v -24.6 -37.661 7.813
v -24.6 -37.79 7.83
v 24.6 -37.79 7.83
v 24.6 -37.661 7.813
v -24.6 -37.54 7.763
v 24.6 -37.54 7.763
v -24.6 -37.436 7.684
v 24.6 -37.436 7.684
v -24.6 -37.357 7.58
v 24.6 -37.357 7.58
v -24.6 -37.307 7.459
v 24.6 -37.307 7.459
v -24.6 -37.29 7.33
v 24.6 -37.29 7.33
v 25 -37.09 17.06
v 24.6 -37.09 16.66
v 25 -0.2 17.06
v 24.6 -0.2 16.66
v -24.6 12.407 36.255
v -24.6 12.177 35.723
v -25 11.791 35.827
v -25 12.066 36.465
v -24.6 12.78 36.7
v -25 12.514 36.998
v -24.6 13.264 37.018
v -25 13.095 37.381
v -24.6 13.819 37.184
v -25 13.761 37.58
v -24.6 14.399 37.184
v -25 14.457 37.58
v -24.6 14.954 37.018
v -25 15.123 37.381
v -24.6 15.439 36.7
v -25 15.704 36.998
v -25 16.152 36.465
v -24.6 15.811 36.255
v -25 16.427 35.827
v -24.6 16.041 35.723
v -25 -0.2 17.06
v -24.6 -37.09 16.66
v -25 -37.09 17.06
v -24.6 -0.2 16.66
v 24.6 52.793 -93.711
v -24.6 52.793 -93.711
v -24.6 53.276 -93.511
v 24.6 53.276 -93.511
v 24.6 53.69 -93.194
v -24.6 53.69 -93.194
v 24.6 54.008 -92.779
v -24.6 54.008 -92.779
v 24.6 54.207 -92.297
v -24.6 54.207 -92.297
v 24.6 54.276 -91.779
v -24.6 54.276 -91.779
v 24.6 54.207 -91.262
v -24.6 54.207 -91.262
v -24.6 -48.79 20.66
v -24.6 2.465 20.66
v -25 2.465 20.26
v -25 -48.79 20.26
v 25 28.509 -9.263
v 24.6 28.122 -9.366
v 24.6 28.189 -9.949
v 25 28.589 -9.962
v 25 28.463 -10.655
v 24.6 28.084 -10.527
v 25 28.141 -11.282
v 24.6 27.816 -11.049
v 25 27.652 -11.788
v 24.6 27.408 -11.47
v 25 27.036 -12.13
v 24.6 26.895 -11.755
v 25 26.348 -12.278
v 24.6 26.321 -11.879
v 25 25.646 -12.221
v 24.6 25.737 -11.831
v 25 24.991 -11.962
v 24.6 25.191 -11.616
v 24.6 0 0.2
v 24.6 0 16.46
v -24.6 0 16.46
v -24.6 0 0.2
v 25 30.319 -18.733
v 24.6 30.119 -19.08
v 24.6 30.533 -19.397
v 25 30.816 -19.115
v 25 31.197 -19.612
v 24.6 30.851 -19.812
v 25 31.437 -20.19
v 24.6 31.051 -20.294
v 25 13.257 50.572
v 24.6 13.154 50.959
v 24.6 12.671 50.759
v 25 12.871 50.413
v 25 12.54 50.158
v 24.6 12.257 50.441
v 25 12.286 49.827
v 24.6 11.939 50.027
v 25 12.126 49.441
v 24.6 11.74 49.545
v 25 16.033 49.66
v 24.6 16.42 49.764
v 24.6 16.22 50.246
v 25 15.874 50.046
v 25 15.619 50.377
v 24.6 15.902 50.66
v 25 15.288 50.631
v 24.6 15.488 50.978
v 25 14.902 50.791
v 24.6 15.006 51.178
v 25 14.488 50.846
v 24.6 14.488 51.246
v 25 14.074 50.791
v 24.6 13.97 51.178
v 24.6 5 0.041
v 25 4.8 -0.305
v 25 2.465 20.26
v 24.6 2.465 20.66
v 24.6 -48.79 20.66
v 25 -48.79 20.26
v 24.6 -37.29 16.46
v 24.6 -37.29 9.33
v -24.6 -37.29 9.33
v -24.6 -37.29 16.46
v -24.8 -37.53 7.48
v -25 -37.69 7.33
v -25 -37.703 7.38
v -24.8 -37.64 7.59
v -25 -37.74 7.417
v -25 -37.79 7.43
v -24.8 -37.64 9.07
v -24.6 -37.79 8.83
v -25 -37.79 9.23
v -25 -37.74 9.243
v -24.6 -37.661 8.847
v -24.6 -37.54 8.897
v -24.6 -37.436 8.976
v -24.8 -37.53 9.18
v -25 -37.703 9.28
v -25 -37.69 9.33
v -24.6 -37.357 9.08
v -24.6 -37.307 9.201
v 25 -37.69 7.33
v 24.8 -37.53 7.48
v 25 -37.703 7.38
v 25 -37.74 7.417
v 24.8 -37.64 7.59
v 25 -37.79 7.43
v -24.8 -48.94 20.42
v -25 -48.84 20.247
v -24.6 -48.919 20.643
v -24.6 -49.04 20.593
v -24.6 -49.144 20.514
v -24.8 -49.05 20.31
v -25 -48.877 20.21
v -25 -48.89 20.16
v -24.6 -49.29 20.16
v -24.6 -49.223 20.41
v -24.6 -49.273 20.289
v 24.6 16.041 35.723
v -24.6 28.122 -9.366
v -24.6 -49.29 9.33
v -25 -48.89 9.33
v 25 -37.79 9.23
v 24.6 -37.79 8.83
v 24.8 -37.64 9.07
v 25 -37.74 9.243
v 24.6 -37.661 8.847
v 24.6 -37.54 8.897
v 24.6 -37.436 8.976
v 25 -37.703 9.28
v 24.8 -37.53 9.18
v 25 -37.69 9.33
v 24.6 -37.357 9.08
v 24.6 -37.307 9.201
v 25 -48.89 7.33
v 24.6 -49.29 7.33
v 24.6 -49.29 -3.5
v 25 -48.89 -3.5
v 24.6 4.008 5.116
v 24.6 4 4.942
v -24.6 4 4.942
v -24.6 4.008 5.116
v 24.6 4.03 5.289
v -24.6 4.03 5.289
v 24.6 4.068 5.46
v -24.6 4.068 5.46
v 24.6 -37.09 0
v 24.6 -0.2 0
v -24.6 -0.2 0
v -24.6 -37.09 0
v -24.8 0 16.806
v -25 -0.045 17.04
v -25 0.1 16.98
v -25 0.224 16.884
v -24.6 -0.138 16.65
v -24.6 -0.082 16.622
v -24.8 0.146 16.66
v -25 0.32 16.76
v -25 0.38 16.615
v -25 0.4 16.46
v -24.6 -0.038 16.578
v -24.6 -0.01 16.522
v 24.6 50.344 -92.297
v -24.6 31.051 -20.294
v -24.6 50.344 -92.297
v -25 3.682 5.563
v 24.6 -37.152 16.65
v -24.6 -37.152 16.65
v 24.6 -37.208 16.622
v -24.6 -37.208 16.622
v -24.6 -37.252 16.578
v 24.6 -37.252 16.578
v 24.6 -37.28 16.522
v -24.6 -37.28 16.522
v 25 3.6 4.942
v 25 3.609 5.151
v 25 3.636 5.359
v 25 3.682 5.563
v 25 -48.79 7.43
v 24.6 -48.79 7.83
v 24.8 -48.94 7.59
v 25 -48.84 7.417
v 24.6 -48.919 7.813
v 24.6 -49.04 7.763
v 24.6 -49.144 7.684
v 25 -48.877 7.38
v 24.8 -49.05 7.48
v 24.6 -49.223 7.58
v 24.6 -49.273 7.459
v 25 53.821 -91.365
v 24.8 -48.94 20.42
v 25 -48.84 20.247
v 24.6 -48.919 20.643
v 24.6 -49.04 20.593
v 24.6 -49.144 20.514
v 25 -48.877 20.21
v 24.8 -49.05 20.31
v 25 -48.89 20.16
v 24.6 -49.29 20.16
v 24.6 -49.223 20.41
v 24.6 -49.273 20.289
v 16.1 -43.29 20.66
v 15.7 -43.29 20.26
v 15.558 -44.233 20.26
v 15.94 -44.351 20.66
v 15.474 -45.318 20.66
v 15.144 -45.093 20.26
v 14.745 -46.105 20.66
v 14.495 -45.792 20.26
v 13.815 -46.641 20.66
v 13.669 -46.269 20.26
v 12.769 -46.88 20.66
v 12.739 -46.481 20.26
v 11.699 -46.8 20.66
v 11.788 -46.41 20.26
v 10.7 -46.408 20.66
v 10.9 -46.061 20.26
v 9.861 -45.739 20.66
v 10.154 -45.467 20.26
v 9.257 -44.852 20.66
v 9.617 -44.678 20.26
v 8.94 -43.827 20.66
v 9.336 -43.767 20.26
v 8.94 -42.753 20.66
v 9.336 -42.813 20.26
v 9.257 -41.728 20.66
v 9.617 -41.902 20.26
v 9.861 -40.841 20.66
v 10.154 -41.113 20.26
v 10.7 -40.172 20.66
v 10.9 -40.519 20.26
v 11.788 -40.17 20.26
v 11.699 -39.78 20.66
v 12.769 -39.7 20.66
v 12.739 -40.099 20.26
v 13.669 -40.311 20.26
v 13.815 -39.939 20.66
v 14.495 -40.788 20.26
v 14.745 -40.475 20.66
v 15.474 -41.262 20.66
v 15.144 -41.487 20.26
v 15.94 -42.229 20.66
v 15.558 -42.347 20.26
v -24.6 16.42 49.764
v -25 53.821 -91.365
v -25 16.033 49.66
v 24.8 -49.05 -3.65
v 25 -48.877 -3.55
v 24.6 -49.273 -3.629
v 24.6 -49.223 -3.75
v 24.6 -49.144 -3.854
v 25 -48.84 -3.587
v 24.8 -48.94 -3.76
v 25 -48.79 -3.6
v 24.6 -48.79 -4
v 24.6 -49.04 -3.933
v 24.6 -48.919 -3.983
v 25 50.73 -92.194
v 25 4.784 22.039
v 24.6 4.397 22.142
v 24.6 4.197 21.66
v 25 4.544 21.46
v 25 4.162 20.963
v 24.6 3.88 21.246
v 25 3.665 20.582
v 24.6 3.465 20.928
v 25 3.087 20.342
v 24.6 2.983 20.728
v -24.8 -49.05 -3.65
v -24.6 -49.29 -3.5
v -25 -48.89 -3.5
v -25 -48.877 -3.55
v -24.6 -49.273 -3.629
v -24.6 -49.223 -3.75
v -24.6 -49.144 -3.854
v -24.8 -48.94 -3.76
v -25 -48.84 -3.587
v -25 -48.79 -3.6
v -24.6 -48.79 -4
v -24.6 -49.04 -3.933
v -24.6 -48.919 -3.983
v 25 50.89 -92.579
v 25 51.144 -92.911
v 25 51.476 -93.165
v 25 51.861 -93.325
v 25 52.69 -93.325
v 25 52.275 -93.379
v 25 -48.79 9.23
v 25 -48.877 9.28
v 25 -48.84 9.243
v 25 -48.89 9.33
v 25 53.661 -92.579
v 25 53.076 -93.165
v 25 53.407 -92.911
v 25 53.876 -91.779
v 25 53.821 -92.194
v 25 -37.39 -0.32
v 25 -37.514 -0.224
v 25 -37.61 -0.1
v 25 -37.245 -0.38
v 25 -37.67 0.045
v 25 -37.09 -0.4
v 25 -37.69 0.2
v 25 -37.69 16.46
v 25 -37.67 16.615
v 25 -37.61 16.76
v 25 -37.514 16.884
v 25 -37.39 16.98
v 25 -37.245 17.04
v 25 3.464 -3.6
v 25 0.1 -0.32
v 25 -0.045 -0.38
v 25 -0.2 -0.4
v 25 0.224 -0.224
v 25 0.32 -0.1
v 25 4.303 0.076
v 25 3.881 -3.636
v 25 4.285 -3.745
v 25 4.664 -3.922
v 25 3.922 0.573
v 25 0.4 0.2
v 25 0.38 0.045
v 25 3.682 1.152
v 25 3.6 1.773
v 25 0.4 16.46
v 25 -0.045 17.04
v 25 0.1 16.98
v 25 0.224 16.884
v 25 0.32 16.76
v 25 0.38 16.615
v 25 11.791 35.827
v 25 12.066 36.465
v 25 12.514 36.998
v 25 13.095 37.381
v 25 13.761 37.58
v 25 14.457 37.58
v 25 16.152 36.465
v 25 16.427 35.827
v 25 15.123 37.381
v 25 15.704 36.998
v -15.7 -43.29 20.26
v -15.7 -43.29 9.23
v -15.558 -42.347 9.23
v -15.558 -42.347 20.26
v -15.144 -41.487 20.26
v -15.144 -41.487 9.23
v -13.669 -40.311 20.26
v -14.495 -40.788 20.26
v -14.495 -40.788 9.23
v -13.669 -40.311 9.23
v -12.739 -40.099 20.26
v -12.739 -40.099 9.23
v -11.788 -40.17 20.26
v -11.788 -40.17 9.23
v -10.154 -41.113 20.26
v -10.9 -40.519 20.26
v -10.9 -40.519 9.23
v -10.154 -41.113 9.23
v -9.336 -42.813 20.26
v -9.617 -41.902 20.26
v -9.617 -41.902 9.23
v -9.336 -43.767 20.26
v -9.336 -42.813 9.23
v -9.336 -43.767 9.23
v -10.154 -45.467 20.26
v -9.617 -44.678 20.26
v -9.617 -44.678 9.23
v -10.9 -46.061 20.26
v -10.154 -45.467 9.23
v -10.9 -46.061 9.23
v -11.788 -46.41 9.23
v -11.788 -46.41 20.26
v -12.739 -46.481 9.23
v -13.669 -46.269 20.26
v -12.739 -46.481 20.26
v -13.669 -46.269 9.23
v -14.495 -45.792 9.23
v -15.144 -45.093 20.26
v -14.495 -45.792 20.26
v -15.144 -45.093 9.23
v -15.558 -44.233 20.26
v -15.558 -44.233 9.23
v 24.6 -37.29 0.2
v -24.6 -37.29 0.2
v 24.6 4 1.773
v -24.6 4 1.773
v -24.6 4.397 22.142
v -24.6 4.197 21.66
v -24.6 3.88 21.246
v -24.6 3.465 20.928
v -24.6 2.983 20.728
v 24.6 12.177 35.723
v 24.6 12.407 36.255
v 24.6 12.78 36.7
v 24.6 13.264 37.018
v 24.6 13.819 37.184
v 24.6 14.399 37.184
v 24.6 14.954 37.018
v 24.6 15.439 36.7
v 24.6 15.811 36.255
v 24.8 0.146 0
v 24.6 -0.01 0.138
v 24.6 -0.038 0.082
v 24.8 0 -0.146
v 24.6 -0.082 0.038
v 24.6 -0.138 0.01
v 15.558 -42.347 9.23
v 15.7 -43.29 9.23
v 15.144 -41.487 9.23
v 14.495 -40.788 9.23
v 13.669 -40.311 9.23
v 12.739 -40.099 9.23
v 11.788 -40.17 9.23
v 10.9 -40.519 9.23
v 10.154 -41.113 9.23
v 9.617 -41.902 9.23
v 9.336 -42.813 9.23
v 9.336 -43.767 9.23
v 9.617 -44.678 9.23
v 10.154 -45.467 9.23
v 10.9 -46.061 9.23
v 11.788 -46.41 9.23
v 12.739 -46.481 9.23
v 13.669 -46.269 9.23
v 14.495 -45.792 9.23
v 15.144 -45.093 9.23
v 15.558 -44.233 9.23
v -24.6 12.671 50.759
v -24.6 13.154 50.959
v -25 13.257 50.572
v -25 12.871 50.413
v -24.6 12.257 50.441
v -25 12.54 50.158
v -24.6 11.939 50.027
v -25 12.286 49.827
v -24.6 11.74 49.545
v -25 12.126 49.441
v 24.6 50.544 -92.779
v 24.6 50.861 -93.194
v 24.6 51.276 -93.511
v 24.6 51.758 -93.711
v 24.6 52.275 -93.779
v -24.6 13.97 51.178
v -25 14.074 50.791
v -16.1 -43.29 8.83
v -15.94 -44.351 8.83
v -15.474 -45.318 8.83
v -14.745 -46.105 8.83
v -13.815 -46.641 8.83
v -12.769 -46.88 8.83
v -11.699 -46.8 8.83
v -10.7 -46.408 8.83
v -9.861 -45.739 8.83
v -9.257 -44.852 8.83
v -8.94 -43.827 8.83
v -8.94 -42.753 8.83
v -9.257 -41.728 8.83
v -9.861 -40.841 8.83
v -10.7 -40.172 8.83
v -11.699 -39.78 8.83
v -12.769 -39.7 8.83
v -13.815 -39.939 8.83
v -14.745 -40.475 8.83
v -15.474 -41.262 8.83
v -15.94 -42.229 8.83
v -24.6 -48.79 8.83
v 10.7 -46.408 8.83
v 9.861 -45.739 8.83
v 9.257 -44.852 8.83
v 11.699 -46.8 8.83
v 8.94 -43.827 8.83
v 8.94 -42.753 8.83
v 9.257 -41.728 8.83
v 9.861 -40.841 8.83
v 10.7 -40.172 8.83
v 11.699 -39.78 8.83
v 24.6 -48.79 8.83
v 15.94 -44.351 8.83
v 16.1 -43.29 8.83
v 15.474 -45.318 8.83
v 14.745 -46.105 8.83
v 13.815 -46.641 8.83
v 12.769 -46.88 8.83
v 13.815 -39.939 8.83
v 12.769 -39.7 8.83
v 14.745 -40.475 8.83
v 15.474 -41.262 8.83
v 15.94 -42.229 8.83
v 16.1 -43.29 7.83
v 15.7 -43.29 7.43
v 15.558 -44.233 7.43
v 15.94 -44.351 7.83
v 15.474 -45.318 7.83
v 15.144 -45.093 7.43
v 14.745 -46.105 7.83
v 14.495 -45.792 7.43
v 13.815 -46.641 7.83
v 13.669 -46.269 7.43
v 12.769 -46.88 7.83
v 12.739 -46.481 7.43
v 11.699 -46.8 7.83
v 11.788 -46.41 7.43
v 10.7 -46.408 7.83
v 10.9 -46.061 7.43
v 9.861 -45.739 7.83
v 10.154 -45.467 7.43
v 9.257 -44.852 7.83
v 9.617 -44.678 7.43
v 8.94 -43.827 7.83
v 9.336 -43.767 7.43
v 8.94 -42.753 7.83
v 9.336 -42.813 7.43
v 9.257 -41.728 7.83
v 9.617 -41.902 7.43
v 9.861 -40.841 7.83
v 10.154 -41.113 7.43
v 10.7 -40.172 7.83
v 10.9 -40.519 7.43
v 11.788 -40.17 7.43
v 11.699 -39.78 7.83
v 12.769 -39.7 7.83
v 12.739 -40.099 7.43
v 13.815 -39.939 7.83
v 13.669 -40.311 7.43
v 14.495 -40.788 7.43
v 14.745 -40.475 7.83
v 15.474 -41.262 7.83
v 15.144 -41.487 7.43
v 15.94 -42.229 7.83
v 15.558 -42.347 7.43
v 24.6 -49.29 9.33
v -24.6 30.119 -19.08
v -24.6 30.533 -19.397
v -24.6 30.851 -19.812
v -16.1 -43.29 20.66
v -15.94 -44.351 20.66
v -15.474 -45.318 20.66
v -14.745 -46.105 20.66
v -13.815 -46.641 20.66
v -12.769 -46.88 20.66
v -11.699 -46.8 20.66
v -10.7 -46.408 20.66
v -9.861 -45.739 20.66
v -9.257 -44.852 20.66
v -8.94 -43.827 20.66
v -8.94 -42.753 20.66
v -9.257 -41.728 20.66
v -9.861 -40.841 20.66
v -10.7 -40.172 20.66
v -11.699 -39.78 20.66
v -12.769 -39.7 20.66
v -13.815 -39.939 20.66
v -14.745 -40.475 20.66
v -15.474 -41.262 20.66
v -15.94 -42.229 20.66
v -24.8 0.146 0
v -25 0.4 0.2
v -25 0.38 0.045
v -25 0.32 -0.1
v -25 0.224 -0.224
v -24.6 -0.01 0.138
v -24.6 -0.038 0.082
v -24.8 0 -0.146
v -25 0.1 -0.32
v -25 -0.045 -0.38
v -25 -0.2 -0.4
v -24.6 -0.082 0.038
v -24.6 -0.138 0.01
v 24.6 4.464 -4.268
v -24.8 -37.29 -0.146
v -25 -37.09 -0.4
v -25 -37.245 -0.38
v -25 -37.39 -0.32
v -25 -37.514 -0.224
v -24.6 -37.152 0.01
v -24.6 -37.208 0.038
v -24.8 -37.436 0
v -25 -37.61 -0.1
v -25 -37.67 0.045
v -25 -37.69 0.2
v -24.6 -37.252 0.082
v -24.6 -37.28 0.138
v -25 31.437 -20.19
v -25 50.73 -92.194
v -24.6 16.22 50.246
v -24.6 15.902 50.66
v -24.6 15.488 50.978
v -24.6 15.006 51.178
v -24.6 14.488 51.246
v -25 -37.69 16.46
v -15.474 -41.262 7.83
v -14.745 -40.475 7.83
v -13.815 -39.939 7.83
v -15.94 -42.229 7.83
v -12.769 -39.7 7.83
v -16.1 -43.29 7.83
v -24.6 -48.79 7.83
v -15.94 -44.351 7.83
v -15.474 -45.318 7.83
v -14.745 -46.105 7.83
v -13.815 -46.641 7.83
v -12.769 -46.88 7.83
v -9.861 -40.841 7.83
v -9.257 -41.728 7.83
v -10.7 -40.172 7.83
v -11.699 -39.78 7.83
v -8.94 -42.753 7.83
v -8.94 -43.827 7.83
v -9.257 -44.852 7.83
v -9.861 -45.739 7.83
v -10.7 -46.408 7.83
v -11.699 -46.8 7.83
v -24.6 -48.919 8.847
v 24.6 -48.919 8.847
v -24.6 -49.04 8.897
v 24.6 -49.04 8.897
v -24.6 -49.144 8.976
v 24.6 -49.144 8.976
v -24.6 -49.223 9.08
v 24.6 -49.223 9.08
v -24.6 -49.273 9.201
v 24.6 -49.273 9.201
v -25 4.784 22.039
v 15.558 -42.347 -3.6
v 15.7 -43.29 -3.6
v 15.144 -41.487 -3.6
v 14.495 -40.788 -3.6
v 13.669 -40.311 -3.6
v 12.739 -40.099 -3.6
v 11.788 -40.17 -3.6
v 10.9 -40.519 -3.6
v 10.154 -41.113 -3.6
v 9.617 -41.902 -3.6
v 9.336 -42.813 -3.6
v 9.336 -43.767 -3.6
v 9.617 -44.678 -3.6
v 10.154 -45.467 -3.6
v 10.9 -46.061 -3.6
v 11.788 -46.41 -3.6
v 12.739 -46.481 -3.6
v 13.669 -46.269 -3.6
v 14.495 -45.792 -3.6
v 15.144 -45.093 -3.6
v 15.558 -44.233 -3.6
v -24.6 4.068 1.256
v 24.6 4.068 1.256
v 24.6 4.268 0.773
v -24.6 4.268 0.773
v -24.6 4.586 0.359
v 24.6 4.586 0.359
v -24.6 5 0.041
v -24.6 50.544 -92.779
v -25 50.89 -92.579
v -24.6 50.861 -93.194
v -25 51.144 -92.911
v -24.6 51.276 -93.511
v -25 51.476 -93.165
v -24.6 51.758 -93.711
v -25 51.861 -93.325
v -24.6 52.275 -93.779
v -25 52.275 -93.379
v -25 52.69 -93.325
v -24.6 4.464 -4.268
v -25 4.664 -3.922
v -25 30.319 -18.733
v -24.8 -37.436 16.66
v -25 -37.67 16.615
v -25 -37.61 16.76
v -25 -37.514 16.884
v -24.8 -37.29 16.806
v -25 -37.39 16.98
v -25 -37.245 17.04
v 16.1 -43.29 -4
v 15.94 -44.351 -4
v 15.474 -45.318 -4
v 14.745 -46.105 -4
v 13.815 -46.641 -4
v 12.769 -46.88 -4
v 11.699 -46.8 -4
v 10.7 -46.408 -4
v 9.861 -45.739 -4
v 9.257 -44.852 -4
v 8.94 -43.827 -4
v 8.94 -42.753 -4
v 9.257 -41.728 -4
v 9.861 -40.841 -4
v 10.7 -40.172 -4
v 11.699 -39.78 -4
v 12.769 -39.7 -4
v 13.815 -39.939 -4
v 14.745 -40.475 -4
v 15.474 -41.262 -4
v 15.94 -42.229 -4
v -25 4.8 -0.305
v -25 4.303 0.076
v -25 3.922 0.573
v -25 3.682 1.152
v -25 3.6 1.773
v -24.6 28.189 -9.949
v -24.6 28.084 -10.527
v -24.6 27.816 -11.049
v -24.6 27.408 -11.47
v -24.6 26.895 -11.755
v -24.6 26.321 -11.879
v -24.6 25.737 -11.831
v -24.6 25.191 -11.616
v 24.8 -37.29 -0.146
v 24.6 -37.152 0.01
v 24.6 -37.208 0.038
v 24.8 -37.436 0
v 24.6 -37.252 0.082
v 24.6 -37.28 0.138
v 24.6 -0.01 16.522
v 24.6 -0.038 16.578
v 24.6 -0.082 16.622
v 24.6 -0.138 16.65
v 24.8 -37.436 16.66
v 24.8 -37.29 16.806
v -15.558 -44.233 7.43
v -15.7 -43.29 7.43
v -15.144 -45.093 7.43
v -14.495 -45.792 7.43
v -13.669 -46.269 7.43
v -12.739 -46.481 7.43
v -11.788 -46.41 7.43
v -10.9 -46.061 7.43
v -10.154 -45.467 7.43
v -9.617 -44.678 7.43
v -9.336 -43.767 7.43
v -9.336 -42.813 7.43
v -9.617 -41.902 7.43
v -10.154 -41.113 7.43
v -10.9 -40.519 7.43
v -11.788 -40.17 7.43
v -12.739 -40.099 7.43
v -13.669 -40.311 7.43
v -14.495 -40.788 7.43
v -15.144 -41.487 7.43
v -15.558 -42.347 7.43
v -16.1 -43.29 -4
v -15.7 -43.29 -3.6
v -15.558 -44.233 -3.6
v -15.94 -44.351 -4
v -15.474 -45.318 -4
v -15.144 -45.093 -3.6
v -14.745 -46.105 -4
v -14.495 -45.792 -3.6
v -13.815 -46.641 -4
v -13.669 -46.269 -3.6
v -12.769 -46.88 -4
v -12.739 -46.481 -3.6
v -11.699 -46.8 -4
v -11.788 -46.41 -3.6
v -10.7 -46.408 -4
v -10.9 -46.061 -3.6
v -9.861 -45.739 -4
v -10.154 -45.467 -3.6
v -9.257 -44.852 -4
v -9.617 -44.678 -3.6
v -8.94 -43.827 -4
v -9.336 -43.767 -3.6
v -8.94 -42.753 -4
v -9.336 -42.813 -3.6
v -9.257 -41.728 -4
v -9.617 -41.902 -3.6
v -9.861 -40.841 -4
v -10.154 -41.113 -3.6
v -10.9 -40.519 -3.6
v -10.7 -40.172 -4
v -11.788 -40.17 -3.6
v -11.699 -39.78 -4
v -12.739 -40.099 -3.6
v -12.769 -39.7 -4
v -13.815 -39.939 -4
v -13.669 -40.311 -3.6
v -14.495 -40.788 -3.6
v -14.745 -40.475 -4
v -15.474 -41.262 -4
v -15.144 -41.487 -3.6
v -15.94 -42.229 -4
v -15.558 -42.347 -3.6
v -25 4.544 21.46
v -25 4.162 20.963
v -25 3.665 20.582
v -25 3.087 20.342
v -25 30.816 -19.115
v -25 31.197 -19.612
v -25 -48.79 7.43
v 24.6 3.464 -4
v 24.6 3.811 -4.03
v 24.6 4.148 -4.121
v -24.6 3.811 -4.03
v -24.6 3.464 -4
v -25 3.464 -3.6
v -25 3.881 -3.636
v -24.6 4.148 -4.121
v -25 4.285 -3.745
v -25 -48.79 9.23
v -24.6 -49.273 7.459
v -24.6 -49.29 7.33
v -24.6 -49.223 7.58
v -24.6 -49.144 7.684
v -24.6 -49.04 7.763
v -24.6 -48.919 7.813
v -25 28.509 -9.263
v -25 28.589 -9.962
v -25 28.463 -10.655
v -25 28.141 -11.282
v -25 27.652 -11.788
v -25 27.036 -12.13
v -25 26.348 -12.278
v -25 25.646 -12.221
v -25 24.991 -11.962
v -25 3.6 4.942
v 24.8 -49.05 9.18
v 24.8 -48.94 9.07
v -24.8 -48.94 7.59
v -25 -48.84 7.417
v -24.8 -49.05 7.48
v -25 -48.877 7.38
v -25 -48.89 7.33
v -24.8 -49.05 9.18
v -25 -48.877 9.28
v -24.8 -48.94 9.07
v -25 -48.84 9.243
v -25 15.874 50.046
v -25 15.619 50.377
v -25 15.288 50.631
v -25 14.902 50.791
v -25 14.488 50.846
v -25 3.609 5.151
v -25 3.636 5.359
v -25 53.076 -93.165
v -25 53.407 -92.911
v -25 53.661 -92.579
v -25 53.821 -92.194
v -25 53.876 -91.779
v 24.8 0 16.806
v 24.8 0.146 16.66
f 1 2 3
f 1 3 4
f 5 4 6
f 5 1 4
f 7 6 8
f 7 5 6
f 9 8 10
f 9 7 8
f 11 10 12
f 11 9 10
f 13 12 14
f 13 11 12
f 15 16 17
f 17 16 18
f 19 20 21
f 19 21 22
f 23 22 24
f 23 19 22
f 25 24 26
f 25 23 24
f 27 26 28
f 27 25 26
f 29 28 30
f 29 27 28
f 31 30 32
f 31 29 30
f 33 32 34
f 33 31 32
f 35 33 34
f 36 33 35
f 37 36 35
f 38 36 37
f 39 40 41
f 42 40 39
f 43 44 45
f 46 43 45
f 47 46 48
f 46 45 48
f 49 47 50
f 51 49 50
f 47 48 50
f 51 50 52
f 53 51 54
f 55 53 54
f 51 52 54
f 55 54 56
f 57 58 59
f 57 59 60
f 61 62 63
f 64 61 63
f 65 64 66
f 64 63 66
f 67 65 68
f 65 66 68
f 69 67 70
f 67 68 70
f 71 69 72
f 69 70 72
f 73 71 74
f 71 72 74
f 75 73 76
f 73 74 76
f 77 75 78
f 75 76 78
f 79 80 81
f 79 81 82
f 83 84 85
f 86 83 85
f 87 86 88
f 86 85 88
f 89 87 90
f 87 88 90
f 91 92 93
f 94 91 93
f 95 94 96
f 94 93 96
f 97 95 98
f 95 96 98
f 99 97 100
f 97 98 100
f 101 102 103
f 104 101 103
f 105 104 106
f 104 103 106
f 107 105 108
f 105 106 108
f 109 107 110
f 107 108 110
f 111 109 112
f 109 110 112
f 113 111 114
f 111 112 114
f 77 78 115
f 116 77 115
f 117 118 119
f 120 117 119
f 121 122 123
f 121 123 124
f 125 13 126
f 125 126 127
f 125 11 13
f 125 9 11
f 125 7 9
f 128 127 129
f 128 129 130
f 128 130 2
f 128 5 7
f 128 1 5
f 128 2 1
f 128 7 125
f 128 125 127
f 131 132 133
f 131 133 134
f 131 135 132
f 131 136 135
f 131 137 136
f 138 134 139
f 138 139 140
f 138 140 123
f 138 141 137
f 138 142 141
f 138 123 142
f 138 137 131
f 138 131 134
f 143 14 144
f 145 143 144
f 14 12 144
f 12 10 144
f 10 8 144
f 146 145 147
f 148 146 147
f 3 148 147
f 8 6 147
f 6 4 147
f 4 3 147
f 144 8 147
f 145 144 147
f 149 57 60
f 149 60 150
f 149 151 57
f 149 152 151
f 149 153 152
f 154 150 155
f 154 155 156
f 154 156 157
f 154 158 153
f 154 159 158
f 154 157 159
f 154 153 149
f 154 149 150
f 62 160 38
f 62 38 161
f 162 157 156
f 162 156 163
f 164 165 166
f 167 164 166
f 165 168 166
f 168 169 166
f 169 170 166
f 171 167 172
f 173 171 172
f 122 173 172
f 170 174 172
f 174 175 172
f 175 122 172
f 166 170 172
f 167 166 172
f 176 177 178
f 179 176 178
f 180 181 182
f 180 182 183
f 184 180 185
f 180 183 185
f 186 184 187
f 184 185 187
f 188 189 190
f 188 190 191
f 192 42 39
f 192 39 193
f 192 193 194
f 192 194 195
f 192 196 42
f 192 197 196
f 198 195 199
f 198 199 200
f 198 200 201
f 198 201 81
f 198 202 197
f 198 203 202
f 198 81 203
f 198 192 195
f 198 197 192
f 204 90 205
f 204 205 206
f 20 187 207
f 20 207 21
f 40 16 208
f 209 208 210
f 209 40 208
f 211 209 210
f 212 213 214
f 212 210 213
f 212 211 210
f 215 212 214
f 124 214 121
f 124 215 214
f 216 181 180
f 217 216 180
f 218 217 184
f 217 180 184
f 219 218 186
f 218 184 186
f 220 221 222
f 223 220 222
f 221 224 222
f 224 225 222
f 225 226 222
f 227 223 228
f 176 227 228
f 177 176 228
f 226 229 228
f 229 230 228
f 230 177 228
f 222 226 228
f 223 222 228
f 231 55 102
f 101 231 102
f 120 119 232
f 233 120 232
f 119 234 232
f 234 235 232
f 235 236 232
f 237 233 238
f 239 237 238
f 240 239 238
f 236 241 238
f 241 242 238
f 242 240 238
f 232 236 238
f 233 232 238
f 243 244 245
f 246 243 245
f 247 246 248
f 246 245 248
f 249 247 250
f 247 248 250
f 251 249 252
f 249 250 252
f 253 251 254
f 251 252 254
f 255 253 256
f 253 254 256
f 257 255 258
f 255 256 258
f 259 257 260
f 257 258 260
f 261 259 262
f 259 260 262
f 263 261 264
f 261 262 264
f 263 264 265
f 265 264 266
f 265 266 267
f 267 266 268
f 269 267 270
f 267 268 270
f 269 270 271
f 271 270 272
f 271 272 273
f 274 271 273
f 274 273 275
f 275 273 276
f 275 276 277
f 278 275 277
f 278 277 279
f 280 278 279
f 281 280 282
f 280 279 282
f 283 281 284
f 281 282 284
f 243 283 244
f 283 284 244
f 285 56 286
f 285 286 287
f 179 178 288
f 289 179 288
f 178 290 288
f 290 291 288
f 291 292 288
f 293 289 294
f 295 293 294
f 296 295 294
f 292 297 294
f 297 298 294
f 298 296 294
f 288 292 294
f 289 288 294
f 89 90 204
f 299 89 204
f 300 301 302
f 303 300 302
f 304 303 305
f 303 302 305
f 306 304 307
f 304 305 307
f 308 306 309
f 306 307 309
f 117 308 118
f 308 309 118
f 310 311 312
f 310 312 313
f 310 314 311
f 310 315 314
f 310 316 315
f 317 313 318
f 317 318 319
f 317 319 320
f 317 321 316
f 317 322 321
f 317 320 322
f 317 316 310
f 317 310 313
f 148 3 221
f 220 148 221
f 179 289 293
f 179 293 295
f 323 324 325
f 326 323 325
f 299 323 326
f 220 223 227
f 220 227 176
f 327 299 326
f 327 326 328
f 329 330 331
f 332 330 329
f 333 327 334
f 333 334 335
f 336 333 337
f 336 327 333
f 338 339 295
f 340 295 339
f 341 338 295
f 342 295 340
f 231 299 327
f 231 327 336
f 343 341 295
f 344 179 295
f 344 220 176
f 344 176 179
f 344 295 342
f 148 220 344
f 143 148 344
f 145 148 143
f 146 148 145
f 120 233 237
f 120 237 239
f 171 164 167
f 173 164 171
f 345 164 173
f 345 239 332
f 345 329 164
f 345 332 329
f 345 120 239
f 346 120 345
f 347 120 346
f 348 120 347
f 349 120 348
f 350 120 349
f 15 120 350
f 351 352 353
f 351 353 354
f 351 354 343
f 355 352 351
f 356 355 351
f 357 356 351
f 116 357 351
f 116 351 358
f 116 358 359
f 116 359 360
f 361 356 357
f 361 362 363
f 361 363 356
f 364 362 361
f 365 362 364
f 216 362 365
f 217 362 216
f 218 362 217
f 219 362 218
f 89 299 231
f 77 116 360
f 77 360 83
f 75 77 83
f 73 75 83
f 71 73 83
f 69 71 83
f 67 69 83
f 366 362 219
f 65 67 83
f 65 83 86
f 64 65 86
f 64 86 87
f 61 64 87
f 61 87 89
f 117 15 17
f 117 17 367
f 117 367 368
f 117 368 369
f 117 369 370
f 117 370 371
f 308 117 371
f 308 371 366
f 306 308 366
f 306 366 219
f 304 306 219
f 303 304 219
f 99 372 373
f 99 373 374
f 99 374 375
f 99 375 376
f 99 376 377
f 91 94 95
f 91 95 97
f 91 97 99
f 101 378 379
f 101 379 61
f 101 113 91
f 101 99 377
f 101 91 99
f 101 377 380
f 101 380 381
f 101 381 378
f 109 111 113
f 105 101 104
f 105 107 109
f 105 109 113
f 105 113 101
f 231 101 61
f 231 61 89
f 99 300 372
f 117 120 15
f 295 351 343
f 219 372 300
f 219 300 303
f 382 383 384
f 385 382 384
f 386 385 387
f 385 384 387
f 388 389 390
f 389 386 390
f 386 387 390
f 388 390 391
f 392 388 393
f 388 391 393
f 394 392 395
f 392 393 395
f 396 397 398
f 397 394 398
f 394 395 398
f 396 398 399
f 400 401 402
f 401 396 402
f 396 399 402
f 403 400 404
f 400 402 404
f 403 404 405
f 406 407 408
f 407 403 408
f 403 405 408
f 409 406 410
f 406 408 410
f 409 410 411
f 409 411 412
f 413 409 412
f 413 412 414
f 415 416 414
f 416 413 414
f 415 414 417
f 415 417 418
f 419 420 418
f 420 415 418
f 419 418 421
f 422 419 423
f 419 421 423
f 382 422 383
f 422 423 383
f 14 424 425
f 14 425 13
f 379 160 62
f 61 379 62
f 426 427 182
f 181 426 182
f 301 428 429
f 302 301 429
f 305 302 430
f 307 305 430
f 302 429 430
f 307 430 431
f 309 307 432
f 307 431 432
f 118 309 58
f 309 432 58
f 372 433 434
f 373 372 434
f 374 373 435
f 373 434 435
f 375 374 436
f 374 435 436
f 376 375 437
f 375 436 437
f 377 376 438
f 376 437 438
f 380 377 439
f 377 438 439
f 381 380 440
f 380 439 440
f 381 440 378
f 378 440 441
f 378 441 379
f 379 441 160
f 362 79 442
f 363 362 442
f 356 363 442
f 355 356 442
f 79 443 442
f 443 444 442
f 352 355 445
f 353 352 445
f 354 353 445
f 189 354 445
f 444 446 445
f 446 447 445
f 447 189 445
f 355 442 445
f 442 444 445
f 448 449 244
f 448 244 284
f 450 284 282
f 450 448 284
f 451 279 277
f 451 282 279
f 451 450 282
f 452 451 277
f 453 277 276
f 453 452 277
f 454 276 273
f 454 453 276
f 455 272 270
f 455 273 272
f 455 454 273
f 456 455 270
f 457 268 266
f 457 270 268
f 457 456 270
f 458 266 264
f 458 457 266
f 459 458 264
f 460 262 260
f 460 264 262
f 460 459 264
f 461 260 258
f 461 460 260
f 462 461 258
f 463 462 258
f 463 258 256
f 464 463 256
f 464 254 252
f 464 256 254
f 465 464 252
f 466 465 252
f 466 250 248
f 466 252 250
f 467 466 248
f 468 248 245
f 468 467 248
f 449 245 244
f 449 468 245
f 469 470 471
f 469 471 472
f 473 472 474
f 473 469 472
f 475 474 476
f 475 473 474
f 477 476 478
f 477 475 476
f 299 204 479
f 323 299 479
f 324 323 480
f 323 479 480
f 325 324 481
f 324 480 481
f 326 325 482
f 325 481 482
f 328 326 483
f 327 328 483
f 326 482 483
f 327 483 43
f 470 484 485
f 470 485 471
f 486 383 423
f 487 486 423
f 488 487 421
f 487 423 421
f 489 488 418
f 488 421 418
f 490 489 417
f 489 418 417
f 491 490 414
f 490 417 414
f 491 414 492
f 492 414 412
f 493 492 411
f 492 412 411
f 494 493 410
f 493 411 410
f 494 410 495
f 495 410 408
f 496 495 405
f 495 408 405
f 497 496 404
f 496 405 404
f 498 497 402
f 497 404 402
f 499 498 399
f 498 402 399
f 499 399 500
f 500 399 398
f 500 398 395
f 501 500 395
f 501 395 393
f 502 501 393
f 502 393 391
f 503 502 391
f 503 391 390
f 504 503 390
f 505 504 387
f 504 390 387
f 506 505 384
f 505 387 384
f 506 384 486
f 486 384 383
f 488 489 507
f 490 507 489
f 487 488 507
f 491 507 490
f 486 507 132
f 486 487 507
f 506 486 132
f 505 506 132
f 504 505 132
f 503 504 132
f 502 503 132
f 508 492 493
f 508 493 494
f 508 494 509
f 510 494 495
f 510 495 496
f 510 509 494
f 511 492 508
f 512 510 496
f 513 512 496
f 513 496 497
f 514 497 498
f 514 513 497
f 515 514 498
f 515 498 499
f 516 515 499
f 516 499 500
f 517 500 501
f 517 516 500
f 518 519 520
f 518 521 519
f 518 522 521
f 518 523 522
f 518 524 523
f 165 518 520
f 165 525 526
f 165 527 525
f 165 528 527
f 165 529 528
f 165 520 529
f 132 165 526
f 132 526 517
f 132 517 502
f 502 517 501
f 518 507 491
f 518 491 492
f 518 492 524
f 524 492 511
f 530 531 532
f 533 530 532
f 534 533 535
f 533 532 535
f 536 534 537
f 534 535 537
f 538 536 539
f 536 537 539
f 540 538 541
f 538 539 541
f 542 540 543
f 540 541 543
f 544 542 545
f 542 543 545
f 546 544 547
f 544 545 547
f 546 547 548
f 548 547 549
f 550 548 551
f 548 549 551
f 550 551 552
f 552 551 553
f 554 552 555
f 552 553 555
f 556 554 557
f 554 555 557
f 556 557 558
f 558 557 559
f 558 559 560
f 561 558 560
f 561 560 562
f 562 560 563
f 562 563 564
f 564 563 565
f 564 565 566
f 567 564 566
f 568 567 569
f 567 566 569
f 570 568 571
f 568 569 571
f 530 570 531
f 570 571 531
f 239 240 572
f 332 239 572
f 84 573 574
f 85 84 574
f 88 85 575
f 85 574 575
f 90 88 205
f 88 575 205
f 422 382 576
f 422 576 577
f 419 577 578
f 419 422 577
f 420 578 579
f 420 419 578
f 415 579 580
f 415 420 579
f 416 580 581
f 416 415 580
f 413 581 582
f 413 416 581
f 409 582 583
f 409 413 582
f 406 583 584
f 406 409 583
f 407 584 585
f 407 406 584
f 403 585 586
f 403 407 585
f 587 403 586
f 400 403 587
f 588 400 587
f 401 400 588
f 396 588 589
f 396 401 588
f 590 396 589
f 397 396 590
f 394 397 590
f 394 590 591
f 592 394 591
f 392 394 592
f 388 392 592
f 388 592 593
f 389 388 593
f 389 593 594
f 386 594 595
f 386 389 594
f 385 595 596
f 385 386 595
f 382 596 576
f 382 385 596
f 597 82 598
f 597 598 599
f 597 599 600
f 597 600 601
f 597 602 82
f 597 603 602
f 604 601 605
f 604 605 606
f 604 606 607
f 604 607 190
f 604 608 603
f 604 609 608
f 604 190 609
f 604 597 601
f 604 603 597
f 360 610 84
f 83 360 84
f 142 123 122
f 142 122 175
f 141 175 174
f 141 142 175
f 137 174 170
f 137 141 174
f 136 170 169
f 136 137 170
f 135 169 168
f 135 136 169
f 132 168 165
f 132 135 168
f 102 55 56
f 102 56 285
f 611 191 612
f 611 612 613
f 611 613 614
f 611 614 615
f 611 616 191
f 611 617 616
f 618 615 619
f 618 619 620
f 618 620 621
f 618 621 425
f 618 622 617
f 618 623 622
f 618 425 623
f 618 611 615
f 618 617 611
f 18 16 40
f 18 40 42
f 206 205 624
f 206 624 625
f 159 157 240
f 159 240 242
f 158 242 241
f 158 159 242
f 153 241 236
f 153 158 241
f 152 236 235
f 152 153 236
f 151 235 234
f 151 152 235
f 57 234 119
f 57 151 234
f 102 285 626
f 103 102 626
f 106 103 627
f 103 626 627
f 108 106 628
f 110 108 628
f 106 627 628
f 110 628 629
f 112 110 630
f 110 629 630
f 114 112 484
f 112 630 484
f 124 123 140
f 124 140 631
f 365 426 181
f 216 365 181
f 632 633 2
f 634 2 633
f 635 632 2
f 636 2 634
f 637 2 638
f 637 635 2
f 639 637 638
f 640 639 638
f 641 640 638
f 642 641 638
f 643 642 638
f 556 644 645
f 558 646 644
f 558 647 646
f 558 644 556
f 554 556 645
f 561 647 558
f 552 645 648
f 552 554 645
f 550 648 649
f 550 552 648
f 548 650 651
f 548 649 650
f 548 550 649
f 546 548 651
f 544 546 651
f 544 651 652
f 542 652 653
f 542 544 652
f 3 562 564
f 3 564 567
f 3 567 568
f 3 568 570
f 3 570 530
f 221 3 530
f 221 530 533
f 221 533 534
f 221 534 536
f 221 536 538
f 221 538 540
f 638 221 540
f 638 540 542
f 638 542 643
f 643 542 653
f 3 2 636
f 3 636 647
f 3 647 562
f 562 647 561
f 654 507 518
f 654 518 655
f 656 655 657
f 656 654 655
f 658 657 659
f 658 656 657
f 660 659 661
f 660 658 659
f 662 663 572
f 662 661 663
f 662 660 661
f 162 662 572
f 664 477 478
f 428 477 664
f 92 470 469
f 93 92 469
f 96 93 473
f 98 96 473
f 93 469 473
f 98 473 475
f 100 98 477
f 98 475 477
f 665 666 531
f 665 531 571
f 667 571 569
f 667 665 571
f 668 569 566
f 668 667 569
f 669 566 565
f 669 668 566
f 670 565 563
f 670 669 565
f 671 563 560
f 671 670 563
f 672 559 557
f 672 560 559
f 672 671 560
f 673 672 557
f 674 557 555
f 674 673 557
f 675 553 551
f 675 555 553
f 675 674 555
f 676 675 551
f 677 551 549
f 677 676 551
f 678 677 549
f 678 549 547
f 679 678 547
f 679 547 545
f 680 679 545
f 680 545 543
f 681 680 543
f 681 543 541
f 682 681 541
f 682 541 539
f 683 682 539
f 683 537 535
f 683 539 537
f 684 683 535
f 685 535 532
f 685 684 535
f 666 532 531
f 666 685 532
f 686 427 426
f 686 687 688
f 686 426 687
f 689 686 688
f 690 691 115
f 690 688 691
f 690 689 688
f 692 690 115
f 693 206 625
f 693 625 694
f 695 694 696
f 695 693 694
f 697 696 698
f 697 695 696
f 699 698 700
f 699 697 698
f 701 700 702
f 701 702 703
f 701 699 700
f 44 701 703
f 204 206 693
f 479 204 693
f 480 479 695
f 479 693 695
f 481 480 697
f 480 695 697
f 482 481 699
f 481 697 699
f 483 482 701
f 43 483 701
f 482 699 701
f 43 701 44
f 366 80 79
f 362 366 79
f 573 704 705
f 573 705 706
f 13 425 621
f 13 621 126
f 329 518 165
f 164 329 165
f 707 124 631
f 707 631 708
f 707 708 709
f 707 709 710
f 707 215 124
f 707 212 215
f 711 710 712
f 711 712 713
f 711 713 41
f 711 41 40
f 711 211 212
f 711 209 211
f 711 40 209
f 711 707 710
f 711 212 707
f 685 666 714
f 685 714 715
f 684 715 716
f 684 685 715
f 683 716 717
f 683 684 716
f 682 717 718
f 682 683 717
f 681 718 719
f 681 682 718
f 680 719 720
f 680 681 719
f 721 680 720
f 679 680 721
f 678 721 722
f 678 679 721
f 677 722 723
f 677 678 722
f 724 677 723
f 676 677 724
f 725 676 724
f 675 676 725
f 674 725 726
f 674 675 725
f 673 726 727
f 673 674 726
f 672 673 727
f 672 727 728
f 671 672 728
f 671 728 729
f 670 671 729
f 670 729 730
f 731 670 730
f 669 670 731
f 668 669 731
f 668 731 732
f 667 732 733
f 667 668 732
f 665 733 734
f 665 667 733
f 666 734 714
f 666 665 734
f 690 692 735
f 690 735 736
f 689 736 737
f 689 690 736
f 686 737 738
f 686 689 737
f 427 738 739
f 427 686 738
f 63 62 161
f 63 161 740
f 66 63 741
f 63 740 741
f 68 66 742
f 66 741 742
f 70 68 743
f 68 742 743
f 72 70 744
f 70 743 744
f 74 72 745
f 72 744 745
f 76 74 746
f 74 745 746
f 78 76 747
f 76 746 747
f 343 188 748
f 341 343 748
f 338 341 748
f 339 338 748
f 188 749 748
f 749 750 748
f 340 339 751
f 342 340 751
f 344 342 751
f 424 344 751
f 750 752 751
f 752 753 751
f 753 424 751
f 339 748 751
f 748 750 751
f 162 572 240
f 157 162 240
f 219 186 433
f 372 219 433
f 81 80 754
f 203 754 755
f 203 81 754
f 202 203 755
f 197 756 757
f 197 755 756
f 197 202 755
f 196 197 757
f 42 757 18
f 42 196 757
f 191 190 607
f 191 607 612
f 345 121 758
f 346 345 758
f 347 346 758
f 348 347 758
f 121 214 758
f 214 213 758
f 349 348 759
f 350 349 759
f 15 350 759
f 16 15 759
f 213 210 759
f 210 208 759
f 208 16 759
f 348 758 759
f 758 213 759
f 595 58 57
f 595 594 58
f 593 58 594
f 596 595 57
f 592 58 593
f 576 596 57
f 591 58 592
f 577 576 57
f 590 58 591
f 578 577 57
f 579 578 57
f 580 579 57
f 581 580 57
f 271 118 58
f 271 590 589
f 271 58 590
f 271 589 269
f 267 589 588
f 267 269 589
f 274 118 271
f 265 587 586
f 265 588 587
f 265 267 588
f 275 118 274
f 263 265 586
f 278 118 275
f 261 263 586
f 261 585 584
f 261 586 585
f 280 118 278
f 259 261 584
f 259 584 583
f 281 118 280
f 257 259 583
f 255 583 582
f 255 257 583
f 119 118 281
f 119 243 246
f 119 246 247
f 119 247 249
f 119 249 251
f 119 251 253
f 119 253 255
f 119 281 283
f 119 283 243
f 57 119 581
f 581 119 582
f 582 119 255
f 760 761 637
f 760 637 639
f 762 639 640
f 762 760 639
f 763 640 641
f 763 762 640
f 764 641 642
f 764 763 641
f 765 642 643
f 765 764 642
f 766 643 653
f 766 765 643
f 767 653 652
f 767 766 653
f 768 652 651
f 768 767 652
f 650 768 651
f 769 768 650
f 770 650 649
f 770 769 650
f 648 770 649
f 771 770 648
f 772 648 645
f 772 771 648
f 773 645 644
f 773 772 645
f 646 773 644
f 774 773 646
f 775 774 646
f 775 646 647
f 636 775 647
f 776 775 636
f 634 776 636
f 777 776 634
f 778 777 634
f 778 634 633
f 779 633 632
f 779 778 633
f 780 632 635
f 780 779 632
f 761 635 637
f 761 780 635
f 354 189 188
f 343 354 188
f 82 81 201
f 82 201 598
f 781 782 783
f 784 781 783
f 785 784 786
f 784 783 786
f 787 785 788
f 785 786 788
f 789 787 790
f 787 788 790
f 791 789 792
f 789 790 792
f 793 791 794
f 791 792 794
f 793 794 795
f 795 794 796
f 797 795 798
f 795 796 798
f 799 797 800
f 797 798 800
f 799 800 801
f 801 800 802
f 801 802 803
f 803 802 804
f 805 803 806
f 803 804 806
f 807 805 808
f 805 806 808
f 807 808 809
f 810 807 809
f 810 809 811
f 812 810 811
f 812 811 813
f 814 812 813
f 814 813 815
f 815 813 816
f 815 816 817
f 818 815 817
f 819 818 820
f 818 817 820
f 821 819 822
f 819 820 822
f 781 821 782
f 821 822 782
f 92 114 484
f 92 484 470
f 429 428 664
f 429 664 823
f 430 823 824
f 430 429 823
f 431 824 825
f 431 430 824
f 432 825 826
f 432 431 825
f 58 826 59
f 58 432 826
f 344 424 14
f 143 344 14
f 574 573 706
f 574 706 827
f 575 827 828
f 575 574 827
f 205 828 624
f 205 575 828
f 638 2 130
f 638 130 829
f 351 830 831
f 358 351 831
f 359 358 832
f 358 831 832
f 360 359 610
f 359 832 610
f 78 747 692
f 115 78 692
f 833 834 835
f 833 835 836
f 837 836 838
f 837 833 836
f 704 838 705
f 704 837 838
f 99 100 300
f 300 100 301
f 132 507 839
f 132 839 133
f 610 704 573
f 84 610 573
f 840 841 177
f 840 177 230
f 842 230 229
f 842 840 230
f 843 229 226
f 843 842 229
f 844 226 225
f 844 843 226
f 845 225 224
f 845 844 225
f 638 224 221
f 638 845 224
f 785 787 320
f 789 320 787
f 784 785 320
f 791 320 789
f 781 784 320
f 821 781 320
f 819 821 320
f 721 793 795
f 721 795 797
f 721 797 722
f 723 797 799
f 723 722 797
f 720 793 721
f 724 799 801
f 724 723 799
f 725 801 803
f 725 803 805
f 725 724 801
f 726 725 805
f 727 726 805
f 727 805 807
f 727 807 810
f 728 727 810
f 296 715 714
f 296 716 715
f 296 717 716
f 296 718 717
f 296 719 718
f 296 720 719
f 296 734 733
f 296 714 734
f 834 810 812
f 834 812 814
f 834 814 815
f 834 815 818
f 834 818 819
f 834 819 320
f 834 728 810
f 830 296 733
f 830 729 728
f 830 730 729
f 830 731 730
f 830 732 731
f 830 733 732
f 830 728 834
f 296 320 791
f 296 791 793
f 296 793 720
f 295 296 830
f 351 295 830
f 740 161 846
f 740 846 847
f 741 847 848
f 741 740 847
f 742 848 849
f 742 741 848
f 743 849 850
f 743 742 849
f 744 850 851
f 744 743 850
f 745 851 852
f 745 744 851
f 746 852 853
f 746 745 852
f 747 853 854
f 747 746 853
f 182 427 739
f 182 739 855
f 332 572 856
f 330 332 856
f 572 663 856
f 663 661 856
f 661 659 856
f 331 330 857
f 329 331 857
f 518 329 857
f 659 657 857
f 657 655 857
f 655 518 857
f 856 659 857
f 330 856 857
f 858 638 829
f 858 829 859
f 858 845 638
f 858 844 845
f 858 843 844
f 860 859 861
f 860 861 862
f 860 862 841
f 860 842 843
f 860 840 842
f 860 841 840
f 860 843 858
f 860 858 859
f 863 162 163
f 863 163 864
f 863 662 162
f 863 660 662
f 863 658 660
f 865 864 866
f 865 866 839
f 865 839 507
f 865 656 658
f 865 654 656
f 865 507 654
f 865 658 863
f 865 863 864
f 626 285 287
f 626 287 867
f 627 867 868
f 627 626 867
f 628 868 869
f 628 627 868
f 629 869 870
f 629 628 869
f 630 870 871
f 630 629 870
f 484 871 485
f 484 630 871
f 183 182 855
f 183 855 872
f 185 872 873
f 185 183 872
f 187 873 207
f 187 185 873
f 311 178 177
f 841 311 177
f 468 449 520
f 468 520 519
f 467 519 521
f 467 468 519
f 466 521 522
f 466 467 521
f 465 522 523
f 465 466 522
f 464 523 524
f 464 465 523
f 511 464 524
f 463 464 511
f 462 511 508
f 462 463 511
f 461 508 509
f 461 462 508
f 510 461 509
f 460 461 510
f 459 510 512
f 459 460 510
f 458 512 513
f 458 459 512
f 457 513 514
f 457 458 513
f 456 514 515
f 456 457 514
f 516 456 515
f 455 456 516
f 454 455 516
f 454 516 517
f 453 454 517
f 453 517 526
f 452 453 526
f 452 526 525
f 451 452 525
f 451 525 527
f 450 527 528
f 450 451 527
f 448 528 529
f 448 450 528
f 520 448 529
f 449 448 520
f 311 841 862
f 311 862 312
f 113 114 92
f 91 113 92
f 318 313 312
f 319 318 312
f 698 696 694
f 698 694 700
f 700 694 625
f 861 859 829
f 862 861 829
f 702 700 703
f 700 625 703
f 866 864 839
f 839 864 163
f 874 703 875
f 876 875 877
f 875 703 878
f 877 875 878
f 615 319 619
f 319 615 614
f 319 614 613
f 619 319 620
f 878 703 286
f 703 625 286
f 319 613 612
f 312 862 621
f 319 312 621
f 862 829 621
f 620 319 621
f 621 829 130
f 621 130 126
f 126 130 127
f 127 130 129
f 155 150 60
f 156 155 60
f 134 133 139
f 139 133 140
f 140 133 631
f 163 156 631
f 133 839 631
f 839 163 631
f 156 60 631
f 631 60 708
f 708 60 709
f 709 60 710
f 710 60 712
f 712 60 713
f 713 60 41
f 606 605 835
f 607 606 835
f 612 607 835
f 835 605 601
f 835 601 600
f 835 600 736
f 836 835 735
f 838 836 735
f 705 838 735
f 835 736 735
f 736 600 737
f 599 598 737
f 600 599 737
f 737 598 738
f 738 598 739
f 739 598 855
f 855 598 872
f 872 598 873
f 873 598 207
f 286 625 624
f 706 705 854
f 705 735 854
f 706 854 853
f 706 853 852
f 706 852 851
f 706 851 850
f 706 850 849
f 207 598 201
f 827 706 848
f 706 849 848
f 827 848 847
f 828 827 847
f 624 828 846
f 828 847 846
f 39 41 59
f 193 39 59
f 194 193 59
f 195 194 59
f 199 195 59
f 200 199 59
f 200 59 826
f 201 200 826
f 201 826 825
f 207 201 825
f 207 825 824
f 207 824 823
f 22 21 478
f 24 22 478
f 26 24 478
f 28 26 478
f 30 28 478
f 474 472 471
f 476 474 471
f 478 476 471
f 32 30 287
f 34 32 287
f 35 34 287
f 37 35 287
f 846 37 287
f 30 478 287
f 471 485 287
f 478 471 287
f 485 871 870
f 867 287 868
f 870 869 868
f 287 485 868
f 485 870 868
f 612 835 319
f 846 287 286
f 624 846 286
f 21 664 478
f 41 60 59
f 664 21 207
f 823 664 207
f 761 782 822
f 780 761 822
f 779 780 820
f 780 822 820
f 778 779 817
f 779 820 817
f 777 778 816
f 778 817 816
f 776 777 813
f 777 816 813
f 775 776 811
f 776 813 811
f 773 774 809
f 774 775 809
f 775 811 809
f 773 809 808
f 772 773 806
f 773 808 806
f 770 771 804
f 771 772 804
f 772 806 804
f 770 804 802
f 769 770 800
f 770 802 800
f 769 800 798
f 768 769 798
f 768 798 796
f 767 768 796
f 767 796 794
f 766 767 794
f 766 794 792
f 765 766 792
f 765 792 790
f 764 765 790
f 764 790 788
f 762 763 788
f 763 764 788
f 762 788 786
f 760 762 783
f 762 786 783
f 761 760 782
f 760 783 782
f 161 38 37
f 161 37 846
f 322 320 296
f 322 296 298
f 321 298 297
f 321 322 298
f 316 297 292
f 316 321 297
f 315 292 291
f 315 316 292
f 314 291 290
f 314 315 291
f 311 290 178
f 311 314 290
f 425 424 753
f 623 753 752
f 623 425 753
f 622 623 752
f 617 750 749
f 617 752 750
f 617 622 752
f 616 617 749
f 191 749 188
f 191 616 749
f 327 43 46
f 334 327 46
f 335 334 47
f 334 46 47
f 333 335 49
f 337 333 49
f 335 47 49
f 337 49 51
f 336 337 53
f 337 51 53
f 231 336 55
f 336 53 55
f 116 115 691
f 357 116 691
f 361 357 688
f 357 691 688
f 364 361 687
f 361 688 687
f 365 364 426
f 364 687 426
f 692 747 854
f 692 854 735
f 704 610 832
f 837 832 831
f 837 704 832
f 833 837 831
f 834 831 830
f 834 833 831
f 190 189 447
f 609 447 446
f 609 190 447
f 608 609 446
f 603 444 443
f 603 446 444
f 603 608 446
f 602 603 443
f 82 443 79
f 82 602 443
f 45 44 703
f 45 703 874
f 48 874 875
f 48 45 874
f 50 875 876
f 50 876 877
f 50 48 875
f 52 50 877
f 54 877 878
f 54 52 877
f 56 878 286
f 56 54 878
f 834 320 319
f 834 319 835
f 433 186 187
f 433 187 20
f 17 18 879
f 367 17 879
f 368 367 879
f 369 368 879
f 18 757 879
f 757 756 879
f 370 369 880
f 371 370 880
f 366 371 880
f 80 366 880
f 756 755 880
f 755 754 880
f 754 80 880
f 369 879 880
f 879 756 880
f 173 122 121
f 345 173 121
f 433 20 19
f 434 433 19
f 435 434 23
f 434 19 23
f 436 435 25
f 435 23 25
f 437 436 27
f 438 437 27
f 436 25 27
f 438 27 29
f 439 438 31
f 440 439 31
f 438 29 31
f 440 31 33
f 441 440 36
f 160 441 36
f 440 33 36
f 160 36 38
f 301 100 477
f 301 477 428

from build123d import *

# Parameters (mm, degrees)
SKETCH1_W               = 8
SKETCH1_H               = 11.83
BOSS_EXTRUDE1_DEPTH     = 25
CUT_EXTRUDE1_DEPTH      = 119.472964421
CUT_EXTRUDE1_DEPTH_BACK = 119.472964421
FILLET1_R               = 2
FILLET2_R               = 0.5
CHAMFER1_SIZE           = 0.4
FILLET3_R               = 0.2
CHAMFER2_SIZE           = 0.4


with BuildPart() as part:
    # Sketch1 → Boss-Extrude1 (new body)
    with BuildSketch(Plane.YZ):
        Polygon((-41.29, -4), (4, -4), (4, 0.618802154), (4, 5.205186779), (4, 20.66), (-41.29, 20.66), (-41.29, 8.83), (-37.29, 8.83), (-37.29, 16.66), (0, 16.66), (0, 0), (-37.29, 0), (-37.29, 7.83), (-41.29, 7.83), align=None)
        Polygon((4, 0.618802154), (4, -4), (30.836144658, -19.493855342), (50.861332538, -94.228873943), (54.725035843, -93.193597763), (15.902179078, 51.69527618), (12.038475773, 50.66), (4, 20.66), (4, 5.205186779), (14.109028134, 42.93259339), (29.372043043, -14.029753727), align=None)
        with Locations((-45.29, 14.745)):
            Rectangle(SKETCH1_W, SKETCH1_H)
        with Locations((-45.29, 1.915)):
            Rectangle(SKETCH1_W, SKETCH1_H)
    extrude(amount=BOSS_EXTRUDE1_DEPTH)

    # Sketch2 → Cut-Extrude1 (cut, two sides: drawn at the far end of the back side and taken through both)
    with BuildSketch(Plane.XY.offset(7.83).offset(-CUT_EXTRUDE1_DEPTH_BACK)):
        with BuildLine():
            ThreePointArc((9.3, -43.29), (12.5, -46.49), (15.7, -43.29))
            Line((15.7, -43.29), (9.3, -43.29))
        make_face()
        with BuildLine():
            Line((9.3, -43.29), (15.7, -43.29))
            ThreePointArc((15.7, -43.29), (12.5, -40.09), (9.3, -43.29))
        make_face()
    extrude(amount=CUT_EXTRUDE1_DEPTH + CUT_EXTRUDE1_DEPTH_BACK, mode=Mode.SUBTRACT)

    # Fillet1
    fillet1_edges = [part.edges().sort_by_distance(p)[0] for p in [
        (12.5, 4, -4),
        (12.5, 30.836144658, -19.493855342),
        (12.5, 50.861332538, -94.228873943),
        (12.5, 54.725035843, -93.193597763),
        (12.5, 15.902179078, 51.69527618),
        (12.5, 12.038475773, 50.66),
        (12.5, 14.109028134, 42.93259339),
        (12.5, 29.372043043, -14.029753727),
        (12.5, 4, 0.618802154),
        (12.5, 4, 5.205186779),
        (12.5, 4, 20.66),
    ]]
    fillet(fillet1_edges, radius=FILLET1_R - 0.0001)  # a hair under: the kernel refuses the full size

    # Fillet2
    fillet2_edges = [part.edges().sort_by_distance(p)[0] for p in [
        (12.5, -37.29, 8.83),
        (12.5, -49.29, 8.83),
        (12.5, -49.29, 20.66),
        (12.5, -49.29, -4),
        (12.5, -49.29, 7.83),
        (12.5, -37.29, 7.83),
    ]]
    fillet(fillet2_edges, radius=FILLET2_R)

    # Chamfer1
    chamfer1_edges = [part.edges().sort_by_distance(p)[0] for p in [
        (15.7, -43.29, 7.83),
        (15.7, -43.29, -4),
        (15.7, -43.29, 20.66),
        (15.7, -43.29, 8.83),
    ]]
    chamfer(chamfer1_edges, length=CHAMFER1_SIZE)

    # Mirror1: part across plane


with BuildPart() as part_1:
    add(part.part)
    add(part.part.mirror(Plane(origin=(0, 0, 0), x_dir=(0, 0, 1), z_dir=(1, 0, 0))))

    # Fillet3
    fillet3_edges = [part_1.edges().sort_by_distance(p)[0] for p in [
        (0, -37.29, 0),
        (0, 0, 0),
        (0, 0, 16.66),
        (0, -37.29, 16.66),
    ]]
    fillet(fillet3_edges, radius=FILLET3_R)

    # Chamfer2
    chamfer2_edges = [part_1.edges().sort_by_distance(p)[0] for p in [
        (25, 54.00763278, -92.779404911),
        (25, 51.27552539, -93.51147088),
        (25, 3.981740618, -4.06814494),
        (25, 30.70541894, -19.594164714),
        (25, 14.109028134, 37.20547315),
        (25, 27.408123551, -11.470324016),
        (25, 4.267935795, 0.773494957),
        (25, 4.017109422, 5.202934281),
        (25, 3.682884739, 21.073272655),
        (25, -43.29, 7.83),
        (25, -49.29, 14.745),
        (25, -43.29, 8.83),
        (25, -37.29, 12.895),
        (25, -49.29, 1.915),
        (25, -49.143553391, 20.513553391),
        (25, -49.143553391, -3.853553391),
        (25, -49.143553391, 8.976446609),
        (25, -49.143553391, 7.683553391),
        (25, -37.436446609, 8.976446609),
        (25, -37.436446609, 7.683553391),
        (-25, -43.29, 7.83),
        (-25, -49.29, 1.915),
        (-25, 17.291410002, -11.673799143),
        (-25, 40.697133492, -56.295566685),
        (-25, 35.313607461, -20.749160791),
        (-25, 13.562099547, 51.06825376),
        (-25, 8.068405021, 35.843494244),
        (-25, -23.162288622, 20.66),
        (-25, -37.29, 12.895),
        (-25, 15.095330785, -5.787090062),
        (-25, 4, 3.357669953),
        (-25, 8.122709007, 20.591346258),
        (-25, 22.081599912, 13.178550448),
        (-25, -43.29, 8.83),
        (-25, -49.29, 14.745),
        (-25, -22.662935795, -4),
        (-25, 3.981740618, -4.06814494),
        (-25, 30.70541894, -19.594164714),
        (-25, 54.00763278, -92.779404911),
        (-25, 51.27552539, -93.51147088),
        (-25, 15.487986226, 50.977873117),
        (-25, 12.257244433, 50.441231339),
        (-25, 14.109028134, 37.20547315),
        (-25, 27.408123551, -11.470324016),
        (-25, 4.267935795, 0.773494957),
        (-25, 4.017109422, 5.202934281),
        (-25, 3.682884739, 21.073272655),
        (-25, -37.436446609, 7.683553391),
        (-25, -37.436446609, 8.976446609),
        (-25, -49.143553391, 7.683553391),
        (-25, -49.143553391, 8.976446609),
        (-25, -49.143553391, -3.853553391),
        (-25, -49.143553391, 20.513553391),
        (-25, -18.645, 0),
        (25, -18.645, 0),
        (-25, 0, 8.33),
        (25, 0, 8.33),
        (-25, -37.29, 3.765),
        (25, -37.29, 3.765),
        (-25, -18.645, 16.66),
        (25, -18.645, 16.66),
        (-25, -0.058578644, 0.058578644),
        (25, -0.058578644, 0.058578644),
        (-25, -37.231421356, 0.058578644),
        (25, -37.231421356, 0.058578644),
        (-25, -37.231421356, 16.601421356),
        (25, -37.231421356, 16.601421356),
        (-25, -0.058578644, 16.601421356),
        (25, -0.058578644, 16.601421356),
        (25, 17.291410002, -11.673799143),
        (25, -22.662935795, -4),
        (25, 40.697133492, -56.295566685),
        (25, 15.095330785, -5.787090062),
        (25, 4, 3.357669953),
        (25, 8.122709007, 20.591346258),
        (25, 22.081599912, 13.178550448),
        (25, 35.313607461, -20.749160791),
        (25, 13.562099547, 51.06825376),
        (25, 8.068405021, 35.843494244),
        (25, -23.162288622, 20.66),
        (25, 12.257244433, 50.441231339),
        (25, 15.487986226, 50.977873117),
    ]]
    chamfer(chamfer2_edges, length=CHAMFER2_SIZE)


solid = part_1.part
